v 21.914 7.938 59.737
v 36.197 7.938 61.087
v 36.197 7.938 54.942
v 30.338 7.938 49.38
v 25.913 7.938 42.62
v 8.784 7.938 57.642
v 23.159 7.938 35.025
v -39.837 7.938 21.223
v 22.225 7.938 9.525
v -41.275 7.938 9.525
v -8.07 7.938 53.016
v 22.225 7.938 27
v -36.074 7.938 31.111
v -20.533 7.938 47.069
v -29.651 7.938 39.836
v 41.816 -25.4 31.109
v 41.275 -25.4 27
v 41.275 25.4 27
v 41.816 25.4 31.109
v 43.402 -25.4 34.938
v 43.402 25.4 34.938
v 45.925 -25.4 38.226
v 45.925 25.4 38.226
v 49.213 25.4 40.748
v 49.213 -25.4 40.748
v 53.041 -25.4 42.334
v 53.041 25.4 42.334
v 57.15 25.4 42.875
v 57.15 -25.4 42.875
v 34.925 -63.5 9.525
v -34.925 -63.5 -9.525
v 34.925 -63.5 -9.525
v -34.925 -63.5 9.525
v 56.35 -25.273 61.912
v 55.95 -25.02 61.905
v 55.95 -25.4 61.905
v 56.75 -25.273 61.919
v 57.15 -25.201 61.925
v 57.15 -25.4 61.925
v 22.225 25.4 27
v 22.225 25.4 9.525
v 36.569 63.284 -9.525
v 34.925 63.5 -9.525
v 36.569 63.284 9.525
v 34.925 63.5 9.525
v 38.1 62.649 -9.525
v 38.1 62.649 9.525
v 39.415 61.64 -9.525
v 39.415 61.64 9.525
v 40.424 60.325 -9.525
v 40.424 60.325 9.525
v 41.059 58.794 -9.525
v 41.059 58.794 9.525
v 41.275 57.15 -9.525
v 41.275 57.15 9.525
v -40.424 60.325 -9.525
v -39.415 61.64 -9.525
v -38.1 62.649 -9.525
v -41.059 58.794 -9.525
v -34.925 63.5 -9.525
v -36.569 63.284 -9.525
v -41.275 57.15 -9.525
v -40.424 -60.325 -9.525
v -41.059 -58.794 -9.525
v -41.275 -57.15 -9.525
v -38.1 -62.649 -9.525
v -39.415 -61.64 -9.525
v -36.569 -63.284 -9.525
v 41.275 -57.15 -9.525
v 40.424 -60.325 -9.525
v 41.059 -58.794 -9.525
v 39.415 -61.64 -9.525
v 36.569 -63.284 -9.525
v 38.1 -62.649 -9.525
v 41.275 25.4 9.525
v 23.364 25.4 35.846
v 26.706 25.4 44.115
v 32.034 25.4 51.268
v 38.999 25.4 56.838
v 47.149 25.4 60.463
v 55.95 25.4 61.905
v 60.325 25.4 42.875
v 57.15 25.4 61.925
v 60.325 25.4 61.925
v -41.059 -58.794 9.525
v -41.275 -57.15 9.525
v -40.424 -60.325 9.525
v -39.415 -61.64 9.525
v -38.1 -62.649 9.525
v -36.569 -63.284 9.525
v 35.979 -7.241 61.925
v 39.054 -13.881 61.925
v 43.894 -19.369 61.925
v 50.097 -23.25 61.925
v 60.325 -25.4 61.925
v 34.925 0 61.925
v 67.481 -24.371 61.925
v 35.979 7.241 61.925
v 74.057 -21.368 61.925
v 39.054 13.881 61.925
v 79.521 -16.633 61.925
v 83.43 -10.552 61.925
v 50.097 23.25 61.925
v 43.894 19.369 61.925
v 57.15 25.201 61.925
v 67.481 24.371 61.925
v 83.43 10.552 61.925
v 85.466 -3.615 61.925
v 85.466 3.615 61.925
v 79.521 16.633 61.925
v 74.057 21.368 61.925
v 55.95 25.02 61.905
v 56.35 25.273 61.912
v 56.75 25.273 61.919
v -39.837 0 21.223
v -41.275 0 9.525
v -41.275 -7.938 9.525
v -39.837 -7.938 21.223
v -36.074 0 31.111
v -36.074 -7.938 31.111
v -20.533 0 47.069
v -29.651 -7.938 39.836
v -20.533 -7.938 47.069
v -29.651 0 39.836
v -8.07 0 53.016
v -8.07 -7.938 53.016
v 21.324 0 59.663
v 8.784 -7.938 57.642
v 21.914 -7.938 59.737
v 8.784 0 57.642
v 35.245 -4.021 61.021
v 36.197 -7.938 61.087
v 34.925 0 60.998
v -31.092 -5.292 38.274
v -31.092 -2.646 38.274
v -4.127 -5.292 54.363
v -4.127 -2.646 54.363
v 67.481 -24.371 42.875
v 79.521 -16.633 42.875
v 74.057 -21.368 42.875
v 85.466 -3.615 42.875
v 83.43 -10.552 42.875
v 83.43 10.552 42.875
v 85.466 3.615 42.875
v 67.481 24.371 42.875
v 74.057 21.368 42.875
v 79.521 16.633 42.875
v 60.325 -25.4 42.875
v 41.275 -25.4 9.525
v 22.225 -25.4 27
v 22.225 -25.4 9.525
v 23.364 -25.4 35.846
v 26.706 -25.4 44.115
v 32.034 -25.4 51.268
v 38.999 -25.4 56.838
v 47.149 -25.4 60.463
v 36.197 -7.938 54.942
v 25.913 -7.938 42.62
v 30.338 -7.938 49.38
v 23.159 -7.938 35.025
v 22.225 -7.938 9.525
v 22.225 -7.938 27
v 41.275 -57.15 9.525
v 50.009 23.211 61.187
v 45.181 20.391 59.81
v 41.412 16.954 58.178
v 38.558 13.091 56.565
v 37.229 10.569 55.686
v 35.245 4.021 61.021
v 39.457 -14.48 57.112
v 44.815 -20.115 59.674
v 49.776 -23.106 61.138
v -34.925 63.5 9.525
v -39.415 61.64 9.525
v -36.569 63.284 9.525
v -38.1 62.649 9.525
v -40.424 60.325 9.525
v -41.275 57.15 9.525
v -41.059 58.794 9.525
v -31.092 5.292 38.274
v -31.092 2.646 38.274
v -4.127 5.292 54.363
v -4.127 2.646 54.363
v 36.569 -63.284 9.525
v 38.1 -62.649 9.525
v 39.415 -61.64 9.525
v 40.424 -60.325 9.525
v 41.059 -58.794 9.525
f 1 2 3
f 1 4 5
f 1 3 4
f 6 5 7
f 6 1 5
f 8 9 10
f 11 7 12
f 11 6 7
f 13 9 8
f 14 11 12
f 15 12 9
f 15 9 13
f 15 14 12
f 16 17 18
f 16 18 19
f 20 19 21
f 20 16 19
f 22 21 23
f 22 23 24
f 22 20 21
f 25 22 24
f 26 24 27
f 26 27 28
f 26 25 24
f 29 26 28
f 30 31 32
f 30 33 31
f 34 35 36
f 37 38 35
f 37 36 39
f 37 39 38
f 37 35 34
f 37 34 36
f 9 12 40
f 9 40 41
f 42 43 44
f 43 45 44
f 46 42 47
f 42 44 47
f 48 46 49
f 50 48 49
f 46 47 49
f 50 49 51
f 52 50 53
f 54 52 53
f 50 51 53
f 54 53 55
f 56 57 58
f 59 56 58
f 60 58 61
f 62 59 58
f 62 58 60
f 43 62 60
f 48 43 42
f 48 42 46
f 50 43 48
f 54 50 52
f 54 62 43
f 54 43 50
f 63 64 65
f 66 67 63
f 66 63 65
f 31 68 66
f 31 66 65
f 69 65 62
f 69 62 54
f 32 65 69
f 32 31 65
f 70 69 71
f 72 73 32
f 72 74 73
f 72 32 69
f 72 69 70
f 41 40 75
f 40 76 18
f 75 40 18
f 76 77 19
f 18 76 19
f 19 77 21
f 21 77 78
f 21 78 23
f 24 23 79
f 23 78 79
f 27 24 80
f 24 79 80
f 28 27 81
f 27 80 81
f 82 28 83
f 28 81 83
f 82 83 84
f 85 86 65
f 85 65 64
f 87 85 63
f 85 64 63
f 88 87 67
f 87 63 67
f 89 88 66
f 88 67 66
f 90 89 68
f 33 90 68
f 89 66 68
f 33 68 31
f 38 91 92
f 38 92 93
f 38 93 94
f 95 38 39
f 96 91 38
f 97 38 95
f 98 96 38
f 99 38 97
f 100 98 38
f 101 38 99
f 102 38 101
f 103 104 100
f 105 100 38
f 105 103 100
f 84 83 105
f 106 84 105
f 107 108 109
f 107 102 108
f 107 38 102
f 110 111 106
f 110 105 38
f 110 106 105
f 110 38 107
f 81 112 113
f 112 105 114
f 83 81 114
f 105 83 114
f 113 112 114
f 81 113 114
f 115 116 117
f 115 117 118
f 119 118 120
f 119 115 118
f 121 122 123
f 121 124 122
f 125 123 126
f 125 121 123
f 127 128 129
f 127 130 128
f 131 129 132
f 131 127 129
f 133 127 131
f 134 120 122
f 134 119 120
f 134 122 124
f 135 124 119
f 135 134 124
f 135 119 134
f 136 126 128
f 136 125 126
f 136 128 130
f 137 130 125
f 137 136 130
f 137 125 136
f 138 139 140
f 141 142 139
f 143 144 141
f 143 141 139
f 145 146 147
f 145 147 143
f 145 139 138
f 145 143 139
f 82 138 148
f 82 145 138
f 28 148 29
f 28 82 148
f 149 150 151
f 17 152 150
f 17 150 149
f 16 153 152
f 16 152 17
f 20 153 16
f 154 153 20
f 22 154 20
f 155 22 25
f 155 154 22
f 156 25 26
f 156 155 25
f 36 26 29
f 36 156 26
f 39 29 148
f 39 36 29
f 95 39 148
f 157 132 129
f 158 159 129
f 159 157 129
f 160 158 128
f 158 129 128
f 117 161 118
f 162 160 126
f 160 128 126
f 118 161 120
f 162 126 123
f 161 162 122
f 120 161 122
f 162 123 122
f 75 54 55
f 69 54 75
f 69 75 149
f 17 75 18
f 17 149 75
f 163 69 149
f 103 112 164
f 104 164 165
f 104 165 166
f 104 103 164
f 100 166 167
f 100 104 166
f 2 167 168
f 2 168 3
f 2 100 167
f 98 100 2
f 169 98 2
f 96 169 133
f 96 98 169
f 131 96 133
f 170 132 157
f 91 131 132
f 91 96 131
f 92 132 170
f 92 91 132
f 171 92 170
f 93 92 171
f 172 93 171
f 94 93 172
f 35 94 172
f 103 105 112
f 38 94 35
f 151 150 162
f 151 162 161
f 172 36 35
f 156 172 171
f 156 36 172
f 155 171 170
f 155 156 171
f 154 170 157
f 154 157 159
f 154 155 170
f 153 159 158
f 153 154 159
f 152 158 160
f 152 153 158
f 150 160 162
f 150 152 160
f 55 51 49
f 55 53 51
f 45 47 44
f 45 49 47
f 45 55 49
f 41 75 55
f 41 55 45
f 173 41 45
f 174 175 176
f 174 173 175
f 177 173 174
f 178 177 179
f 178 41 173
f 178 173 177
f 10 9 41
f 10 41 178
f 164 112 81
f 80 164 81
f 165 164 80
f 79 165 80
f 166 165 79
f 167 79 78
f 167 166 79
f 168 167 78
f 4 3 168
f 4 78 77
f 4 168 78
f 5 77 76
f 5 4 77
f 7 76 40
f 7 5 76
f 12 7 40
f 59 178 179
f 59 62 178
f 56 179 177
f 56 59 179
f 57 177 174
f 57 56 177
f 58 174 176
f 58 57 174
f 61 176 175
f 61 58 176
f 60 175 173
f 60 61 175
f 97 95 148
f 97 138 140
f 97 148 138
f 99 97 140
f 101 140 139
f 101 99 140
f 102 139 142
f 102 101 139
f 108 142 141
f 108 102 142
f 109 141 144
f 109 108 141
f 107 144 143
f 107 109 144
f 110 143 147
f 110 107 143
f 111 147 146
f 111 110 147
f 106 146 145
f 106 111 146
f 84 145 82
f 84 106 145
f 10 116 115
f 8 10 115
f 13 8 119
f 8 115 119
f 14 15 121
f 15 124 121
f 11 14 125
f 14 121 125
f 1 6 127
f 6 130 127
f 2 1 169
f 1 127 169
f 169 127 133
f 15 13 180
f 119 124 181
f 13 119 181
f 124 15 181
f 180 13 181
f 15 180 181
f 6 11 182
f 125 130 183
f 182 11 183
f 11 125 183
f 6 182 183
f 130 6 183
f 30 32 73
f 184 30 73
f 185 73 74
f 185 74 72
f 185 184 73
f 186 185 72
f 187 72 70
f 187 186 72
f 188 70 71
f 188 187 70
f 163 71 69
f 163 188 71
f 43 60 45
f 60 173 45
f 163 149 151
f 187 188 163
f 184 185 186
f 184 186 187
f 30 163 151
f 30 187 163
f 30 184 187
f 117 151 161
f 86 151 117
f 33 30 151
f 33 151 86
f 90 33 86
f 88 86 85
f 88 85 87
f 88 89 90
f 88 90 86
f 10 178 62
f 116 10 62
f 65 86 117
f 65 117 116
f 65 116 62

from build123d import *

# Parameters (mm, degrees)
F1_DEPTH = 63.5
F2_DEPTH = 25.4
F3_DEPTH = 7.9375
F5_R     = 6.35


with BuildPart() as f1:
    # F0 (on Front) → F1 (new body, symmetric)
    with BuildSketch(Plane.XZ):
        Polygon((-41.275, -9.525), (41.275, -9.525), (41.275, 9.525), (22.225, 9.525), (-41.275, 9.525), align=None)
    extrude(amount=F1_DEPTH, both=True)

    # F0 (on Front) → F2 (join, symmetric)
    with BuildSketch(Plane.XZ):
        with BuildLine():
            Line((22.225, 9.525), (41.275, 9.525))
            Line((41.275, 9.525), (41.275, 27.0002))
            ThreePointArc((41.275, 27.0002), (45.9246798487, 38.2255201513), (57.15, 42.8752))
            Line((57.15, 42.8752), (60.325, 42.8752))
            Line((60.325, 42.8752), (60.325, 61.9252))
            Line((60.325, 61.9252), (57.15, 61.9252))
            add(Edge.make_bspline(
                [(55.950364042, 61.9045908208), (56.3494203194, 61.9119140361), (56.7493016333, 61.9187812014), (57.15, 61.9252)],
                knots=[110.7227393915, 110.7227393915, 110.7227393915, 110.7227393915, 111.5045361635, 111.5045361635, 111.5045361635, 111.5045361635], degree=3))
            ThreePointArc((55.950364042, 61.9045908208), (32.0337412138, 51.2680628969), (22.225, 27.0002))
            Line((22.225, 27.0002), (22.225, 9.525))
        make_face()
    extrude(amount=F2_DEPTH, both=True)

    # F0 (on Front) → F3 (join, symmetric)
    with BuildSketch(Plane.XZ):
        with BuildLine():
            add(Edge.make_bspline(
                [(-41.275, 9.525), (-40.5345981749, 50.6828617224), (-0.5663750684, 60.8674332248), (55.950364042, 61.9045908208)],
                knots=[0, 0, 0, 0, 110.7227393915, 110.7227393915, 110.7227393915, 110.7227393915], degree=3))
            Line((-41.275, 9.525), (22.225, 9.525))
            Line((22.225, 9.525), (22.225, 27.0002))
            ThreePointArc((22.225, 27.0002), (32.0337412138, 51.2680628969), (55.950364042, 61.9045908208))
        make_face()
    extrude(amount=F3_DEPTH, both=True)

    # F0 (on Front) → F4 (revolve)
    with BuildSketch(Plane.XZ):
        Polygon((60.325, 61.9252), (60.325, 42.8752), (85.725, 42.8752), (85.725, 47.9196608067), (85.725, 61.9252), align=None)
    revolve(axis=Axis((60.325, 0, 52.3875), (0, 0, 1)))

    # F5
    f5_edges = [f1.edges().sort_by_distance(p)[0] for p in [
        (41.275, -63.5, 0),
        (-41.275, -63.5, 0),
        (41.275, 63.5, 0),
        (-41.275, 63.5, 0),
    ]]
    fillet(f5_edges, radius=F5_R)


solid = f1.part
